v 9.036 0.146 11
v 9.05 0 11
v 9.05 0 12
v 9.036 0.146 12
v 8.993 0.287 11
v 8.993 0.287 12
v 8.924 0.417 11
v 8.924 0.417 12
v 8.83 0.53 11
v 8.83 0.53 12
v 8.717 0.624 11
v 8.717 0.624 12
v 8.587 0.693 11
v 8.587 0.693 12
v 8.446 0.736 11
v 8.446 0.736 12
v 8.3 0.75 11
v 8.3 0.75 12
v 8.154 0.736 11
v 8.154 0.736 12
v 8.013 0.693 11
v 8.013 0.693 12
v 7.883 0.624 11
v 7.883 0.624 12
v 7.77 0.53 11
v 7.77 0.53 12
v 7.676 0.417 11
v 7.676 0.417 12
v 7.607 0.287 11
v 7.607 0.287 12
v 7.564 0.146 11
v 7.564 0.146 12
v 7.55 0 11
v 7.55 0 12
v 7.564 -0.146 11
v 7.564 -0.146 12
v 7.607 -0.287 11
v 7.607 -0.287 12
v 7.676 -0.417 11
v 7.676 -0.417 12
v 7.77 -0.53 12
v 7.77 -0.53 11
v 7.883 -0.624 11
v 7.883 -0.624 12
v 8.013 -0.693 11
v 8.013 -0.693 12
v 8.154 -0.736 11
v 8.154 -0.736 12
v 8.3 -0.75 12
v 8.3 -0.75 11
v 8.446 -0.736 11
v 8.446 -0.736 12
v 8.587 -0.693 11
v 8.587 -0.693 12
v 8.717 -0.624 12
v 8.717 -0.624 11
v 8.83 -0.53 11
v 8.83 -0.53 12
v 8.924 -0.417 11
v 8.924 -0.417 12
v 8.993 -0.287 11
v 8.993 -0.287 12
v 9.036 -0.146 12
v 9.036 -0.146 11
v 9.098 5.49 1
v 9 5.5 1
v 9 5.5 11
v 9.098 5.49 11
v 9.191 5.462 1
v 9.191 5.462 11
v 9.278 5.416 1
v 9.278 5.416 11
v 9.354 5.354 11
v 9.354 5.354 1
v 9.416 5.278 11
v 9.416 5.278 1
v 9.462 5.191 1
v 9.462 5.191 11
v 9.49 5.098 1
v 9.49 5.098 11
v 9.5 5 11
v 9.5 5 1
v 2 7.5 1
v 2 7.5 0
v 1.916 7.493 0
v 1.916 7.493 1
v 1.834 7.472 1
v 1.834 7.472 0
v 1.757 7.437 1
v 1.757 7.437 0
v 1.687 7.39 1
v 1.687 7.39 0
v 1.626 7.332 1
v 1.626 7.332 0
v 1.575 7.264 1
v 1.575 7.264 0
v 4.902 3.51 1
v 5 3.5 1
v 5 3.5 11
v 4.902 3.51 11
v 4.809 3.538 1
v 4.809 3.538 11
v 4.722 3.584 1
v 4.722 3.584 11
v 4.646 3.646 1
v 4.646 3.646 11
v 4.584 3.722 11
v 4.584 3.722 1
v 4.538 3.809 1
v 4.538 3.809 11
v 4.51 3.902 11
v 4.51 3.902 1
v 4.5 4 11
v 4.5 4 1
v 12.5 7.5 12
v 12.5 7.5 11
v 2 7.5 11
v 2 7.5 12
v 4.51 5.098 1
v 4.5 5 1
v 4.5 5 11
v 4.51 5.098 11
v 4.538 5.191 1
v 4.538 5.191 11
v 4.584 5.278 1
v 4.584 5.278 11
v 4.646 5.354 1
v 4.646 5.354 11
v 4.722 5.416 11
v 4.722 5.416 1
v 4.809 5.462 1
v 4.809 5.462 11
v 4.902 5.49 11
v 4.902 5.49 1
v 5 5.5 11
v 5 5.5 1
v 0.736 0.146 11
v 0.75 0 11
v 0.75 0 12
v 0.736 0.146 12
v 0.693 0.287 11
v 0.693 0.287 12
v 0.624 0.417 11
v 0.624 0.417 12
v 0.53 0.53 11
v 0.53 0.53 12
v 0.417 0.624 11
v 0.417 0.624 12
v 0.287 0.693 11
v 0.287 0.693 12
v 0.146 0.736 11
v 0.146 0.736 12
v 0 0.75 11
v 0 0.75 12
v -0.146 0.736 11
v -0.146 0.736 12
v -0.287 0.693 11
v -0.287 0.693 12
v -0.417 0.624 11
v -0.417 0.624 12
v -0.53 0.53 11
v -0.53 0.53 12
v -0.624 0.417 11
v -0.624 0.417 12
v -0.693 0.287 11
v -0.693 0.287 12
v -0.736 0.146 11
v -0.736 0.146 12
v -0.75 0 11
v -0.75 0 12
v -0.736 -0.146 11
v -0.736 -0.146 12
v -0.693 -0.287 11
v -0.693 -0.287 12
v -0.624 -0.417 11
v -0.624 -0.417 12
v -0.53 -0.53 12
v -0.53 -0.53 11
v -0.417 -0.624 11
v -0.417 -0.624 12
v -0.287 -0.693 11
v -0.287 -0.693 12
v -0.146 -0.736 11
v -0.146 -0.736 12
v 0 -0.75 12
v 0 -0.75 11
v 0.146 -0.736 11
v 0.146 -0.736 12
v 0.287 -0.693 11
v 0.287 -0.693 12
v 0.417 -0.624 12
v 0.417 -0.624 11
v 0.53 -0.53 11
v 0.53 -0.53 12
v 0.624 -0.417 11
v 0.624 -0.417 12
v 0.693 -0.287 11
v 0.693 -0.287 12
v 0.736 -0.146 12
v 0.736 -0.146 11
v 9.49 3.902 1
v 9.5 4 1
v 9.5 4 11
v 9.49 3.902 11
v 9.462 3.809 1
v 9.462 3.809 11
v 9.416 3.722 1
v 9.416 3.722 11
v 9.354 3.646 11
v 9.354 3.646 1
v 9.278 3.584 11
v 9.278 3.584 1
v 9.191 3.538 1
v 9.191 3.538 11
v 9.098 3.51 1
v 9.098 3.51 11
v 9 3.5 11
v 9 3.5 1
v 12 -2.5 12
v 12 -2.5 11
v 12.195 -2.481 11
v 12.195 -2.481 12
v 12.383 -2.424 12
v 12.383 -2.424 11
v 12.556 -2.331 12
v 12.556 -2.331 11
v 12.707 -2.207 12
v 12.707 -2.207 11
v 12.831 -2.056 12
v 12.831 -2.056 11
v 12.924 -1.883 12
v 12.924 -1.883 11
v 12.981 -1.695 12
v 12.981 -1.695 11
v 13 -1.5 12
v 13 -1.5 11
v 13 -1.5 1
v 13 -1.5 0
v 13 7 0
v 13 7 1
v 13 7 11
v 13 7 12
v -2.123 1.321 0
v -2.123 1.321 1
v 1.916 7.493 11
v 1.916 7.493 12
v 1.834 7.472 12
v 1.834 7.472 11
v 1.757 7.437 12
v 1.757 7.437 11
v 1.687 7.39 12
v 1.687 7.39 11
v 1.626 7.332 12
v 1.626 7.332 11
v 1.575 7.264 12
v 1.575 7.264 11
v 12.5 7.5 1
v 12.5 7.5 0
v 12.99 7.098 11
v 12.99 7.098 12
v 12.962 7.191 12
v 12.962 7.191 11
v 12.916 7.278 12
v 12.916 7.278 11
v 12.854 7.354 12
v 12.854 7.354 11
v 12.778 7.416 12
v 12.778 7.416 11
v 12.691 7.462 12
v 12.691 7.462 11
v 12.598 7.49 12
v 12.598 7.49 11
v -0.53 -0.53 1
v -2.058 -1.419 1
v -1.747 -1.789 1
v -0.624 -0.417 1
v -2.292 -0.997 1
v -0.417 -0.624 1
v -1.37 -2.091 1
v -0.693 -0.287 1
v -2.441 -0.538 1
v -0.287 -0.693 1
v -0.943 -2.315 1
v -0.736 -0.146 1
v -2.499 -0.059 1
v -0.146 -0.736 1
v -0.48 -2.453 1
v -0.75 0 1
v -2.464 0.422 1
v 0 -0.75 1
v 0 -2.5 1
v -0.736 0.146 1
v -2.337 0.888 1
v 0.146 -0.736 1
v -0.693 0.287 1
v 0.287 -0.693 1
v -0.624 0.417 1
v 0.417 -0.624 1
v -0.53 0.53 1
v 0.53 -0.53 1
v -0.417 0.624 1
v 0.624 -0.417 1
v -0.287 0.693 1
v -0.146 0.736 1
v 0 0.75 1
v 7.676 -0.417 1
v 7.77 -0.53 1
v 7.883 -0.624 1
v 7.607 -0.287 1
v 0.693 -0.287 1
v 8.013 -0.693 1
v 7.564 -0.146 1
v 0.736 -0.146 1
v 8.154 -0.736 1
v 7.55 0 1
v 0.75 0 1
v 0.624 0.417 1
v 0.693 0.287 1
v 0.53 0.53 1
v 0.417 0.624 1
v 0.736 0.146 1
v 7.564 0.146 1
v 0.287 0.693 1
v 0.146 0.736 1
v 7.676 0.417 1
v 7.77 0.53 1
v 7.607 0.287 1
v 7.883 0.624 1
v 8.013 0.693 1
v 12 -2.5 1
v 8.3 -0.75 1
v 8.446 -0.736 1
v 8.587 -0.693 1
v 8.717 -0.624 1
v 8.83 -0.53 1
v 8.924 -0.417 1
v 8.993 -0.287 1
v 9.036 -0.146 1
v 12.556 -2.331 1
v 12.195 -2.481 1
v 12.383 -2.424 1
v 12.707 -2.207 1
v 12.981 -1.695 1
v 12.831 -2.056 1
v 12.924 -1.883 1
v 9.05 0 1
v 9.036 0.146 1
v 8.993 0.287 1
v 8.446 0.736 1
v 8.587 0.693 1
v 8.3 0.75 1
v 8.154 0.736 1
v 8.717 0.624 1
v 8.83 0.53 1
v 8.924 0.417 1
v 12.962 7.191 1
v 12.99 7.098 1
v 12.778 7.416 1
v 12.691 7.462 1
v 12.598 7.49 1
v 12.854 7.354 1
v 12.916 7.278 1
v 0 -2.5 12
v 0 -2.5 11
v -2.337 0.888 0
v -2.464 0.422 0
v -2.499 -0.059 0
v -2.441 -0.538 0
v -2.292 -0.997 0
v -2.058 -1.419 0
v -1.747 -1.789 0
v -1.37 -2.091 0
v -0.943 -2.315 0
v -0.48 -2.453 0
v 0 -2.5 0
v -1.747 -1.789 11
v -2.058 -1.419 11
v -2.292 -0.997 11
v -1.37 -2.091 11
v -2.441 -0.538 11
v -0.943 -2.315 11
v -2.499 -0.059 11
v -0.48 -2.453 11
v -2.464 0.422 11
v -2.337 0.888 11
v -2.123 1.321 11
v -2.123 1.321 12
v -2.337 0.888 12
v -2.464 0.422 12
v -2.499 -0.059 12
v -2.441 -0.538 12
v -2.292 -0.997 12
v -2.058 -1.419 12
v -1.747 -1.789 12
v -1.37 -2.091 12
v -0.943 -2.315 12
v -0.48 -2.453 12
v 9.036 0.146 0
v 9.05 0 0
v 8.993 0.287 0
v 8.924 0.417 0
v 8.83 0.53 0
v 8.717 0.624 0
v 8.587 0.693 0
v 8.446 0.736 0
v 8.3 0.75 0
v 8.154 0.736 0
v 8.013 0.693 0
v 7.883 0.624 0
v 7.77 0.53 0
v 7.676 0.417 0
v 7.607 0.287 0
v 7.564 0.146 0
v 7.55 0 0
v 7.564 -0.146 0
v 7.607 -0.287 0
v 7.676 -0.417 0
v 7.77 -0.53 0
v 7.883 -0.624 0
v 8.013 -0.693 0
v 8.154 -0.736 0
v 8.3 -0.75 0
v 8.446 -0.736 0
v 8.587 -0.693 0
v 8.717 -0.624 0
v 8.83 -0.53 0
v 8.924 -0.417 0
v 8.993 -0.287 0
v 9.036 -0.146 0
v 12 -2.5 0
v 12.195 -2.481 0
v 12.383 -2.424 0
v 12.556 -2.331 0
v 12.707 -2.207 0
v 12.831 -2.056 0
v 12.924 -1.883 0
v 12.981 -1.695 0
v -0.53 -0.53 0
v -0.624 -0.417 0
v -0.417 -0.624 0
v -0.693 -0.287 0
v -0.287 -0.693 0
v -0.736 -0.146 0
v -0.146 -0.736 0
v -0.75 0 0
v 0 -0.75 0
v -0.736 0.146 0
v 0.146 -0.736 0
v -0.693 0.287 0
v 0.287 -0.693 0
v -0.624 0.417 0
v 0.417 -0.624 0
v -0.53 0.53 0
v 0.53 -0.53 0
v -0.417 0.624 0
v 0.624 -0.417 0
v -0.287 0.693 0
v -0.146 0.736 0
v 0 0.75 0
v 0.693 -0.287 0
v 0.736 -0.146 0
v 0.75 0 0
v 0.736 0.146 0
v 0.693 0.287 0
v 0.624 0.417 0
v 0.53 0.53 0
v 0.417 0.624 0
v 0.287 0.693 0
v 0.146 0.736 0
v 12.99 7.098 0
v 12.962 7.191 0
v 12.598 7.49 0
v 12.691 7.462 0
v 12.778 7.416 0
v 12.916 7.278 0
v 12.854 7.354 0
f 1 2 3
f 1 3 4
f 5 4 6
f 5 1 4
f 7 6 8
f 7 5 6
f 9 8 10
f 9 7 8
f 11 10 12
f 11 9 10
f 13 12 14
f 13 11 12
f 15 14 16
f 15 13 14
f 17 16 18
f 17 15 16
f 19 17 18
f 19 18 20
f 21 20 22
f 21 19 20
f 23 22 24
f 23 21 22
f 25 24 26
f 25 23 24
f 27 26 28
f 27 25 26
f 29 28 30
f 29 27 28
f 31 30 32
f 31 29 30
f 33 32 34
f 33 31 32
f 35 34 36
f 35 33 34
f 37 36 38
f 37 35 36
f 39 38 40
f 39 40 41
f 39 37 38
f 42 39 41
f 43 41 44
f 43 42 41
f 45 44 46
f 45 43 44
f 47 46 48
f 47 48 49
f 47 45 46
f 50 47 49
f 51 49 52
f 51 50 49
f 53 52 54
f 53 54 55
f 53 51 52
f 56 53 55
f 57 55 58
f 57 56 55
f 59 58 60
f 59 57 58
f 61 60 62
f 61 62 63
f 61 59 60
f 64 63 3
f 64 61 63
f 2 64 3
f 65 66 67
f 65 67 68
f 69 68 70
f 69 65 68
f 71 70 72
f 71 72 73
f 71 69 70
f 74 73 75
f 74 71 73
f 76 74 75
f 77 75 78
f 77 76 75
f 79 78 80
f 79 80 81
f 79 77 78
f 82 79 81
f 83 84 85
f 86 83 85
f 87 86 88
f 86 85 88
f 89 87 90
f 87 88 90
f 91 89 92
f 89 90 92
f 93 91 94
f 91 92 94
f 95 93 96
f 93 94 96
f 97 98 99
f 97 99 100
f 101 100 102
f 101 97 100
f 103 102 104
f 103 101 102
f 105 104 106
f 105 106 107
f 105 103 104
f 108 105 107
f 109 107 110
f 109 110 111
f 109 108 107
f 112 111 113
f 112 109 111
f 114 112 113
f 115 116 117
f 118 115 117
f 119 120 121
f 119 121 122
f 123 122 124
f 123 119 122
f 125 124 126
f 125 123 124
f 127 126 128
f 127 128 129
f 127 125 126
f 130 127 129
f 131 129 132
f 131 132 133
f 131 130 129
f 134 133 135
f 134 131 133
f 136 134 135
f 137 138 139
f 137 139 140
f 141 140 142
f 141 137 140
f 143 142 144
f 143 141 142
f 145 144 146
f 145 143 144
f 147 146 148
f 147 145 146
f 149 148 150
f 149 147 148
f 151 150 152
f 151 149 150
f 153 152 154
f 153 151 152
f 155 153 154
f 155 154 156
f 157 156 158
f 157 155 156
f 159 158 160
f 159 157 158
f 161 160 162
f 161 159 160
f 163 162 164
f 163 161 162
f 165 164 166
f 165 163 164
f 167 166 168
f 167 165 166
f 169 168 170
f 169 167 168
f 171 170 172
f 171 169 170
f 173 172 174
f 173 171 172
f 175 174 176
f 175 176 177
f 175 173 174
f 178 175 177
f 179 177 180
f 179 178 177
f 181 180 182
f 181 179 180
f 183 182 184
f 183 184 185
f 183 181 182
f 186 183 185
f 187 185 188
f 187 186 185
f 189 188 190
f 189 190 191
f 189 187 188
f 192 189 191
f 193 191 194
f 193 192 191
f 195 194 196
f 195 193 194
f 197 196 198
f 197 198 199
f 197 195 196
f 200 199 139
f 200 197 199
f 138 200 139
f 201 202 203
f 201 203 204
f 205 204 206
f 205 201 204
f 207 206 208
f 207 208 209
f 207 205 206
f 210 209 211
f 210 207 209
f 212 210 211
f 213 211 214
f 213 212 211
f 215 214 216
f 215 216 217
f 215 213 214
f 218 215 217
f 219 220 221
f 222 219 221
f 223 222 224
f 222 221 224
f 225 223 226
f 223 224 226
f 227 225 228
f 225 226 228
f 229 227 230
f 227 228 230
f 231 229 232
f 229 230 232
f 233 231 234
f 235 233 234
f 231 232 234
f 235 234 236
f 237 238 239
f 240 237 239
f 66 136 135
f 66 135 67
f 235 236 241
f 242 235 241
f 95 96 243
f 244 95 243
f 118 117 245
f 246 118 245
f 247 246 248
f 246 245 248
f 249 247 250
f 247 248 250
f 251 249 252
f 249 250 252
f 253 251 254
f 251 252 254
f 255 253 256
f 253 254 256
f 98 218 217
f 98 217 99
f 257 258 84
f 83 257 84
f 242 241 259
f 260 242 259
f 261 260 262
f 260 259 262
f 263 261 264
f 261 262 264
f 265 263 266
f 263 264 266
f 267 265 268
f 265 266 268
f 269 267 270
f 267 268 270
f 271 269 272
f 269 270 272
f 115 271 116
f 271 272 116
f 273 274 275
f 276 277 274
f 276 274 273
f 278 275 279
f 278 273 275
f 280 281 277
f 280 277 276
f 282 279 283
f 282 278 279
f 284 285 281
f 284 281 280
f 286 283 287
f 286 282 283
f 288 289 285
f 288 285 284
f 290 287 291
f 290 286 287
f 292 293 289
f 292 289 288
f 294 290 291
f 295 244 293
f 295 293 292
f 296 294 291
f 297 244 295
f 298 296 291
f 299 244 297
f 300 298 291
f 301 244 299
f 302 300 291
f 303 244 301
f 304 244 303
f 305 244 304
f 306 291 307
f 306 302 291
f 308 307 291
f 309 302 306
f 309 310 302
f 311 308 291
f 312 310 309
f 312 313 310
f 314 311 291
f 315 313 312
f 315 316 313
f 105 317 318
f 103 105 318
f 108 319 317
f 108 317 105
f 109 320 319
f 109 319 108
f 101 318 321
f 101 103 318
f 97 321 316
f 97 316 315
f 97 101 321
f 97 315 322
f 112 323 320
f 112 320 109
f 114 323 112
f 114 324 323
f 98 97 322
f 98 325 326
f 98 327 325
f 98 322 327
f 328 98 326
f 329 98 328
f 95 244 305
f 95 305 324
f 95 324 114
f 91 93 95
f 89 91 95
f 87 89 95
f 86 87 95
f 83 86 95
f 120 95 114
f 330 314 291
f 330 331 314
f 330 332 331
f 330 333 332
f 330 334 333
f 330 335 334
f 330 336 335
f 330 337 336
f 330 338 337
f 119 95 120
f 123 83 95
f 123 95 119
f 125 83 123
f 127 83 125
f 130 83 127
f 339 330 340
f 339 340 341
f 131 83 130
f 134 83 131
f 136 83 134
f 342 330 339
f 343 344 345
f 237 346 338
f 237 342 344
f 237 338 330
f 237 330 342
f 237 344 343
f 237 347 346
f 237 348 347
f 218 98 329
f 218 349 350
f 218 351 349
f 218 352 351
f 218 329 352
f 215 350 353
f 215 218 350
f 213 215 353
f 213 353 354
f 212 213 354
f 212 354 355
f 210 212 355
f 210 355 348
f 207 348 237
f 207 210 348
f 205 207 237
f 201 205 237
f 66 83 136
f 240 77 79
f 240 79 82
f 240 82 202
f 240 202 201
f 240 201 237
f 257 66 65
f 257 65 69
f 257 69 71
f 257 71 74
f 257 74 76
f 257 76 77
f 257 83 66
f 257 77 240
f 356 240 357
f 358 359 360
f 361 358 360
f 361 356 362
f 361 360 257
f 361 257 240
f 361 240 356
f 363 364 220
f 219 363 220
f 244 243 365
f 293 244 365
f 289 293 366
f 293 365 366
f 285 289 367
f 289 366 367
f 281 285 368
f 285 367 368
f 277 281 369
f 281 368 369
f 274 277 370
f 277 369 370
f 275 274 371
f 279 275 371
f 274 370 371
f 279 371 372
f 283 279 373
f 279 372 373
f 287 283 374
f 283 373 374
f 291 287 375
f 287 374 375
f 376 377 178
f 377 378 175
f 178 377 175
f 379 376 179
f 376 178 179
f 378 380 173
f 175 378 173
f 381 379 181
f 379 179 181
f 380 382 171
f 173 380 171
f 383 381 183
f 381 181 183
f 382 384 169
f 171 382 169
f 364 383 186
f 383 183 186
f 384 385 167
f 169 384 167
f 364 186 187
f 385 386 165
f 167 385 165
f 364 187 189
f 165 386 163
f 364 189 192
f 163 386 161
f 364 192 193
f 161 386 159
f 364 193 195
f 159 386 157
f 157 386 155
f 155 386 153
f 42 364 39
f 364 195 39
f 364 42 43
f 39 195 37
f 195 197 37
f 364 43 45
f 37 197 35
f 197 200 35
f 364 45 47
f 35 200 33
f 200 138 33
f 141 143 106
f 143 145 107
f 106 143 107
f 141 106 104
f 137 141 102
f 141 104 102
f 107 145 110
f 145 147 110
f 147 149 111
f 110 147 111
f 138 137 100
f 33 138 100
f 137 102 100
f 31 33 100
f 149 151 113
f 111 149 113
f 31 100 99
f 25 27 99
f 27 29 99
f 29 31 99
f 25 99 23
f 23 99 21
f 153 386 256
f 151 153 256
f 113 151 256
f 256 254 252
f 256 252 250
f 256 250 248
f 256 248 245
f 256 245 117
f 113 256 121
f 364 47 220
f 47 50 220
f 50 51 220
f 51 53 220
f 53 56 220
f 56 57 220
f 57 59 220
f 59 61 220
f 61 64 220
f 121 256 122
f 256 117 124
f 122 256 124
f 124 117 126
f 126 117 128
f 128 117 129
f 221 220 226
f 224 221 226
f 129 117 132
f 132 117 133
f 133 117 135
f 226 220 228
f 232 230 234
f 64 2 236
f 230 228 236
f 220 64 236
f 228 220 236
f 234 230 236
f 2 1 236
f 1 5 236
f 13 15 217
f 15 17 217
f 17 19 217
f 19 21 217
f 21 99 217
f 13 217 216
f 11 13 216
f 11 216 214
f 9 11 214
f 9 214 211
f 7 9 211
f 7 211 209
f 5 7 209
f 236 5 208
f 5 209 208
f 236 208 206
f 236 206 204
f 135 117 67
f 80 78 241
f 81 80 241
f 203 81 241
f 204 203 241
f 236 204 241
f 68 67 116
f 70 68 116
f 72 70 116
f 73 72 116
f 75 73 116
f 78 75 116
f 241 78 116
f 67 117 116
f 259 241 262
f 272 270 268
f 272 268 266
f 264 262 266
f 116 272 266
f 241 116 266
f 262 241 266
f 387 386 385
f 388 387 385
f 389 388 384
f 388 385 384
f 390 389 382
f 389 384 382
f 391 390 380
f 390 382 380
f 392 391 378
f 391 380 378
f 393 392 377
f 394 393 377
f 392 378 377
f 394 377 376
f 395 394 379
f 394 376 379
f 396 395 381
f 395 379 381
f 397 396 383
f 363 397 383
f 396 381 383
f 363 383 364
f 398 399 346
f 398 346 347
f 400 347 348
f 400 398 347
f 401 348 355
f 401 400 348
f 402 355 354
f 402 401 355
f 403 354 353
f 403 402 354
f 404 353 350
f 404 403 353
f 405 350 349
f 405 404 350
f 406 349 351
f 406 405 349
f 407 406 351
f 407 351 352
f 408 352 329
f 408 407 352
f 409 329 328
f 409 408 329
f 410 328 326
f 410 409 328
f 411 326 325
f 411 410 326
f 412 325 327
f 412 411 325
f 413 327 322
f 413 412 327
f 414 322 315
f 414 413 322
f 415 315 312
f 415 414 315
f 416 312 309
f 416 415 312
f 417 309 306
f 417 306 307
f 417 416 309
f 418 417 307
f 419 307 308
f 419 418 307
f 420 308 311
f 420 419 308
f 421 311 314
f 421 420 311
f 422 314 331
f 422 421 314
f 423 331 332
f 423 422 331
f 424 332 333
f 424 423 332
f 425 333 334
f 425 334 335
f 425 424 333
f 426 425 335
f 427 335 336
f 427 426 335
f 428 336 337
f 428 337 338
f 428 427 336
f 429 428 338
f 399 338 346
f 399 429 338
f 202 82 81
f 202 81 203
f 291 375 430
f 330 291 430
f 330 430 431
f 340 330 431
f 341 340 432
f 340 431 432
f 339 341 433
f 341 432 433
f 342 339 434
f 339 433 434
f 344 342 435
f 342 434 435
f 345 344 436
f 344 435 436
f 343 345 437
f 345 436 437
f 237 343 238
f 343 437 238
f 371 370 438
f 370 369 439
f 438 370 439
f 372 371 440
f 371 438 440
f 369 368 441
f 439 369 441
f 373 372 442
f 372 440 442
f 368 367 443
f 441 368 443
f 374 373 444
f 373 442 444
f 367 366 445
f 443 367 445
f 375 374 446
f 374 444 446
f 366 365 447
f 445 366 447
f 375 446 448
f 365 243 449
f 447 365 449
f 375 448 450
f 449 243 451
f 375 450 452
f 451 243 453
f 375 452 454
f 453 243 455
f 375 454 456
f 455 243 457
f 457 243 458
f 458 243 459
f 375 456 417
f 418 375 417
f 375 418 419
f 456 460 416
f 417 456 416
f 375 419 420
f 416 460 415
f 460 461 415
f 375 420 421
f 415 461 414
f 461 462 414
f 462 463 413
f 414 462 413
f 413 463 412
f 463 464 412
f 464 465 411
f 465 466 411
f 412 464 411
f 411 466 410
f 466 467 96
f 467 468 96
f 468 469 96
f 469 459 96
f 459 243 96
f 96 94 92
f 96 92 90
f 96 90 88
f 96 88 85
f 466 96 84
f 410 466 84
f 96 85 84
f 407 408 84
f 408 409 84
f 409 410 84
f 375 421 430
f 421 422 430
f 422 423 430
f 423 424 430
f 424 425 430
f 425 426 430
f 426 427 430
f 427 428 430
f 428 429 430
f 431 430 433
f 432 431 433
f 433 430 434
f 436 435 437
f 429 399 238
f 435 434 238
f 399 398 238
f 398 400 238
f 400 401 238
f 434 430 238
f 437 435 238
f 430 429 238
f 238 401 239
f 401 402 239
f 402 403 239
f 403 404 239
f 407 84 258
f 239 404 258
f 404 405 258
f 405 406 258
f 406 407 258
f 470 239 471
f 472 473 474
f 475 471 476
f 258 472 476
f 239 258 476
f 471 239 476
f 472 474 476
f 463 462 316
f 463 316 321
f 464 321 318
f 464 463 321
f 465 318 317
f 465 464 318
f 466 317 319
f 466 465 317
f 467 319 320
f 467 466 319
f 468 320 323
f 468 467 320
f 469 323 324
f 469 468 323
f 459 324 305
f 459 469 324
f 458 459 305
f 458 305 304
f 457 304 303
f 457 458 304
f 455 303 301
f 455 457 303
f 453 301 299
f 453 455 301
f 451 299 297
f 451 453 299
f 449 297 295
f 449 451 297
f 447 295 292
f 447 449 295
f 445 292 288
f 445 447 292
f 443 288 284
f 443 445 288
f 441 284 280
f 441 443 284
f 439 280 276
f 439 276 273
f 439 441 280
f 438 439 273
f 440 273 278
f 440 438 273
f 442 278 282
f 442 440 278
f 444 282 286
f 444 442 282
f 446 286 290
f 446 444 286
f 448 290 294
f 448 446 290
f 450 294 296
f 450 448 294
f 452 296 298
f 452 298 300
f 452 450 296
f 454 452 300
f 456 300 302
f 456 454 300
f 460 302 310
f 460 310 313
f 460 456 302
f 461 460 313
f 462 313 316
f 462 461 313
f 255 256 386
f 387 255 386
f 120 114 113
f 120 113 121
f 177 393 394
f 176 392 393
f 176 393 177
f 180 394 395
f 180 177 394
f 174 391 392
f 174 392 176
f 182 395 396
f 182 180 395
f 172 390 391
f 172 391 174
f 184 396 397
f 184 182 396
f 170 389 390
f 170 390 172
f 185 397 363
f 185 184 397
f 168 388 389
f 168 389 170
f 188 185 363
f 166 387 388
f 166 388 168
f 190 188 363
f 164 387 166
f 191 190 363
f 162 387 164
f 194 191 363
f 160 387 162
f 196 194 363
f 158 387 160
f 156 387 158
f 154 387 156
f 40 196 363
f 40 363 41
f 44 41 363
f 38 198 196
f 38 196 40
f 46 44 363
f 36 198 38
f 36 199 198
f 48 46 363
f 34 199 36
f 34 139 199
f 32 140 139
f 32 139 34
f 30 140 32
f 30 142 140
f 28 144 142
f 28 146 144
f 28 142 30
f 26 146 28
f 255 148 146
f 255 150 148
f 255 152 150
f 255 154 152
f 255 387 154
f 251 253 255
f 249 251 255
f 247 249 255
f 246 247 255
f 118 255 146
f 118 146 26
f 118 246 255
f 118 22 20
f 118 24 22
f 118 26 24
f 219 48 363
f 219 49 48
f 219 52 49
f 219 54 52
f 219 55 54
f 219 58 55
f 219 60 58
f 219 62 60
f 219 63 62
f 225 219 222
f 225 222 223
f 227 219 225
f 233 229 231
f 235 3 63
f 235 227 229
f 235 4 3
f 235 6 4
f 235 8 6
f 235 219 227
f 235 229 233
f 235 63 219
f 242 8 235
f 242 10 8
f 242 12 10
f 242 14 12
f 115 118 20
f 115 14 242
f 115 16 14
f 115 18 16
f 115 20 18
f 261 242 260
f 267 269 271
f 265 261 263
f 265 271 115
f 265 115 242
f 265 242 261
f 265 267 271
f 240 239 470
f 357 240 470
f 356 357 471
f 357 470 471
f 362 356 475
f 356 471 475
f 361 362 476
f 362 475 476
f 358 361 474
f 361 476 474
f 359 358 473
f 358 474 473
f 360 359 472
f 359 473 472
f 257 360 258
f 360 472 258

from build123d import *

# Parameters (mm, degrees)
SKETCH1_R           = 0.75
BOSS_EXTRUDE1_DEPTH = 1
BOSS_EXTRUDE2_START = 1
BOSS_EXTRUDE2_DEPTH = 10
BOSS_EXTRUDE3_START = 11
SKETCH1_4_R         = 0.75
BOSS_EXTRUDE3_DEPTH = 1


with BuildPart() as part:
    # Sketch1 → Boss-Extrude1 (new body)
    with BuildSketch(Plane.XY):
        with BuildLine():
            Line((1.575471698, 7.264150943), (-2.122641509, 1.320754717))
            ThreePointArc((-2.122641509, 1.320754717), (-2.18539319, -1.214107328), (0, -2.5))
            Line((0, -2.5), (12, -2.5))
            ThreePointArc((12, -2.5), (12.707106781, -2.207106781), (13, -1.5))
            Line((13, -1.5), (13, 7))
            ThreePointArc((13, 7), (12.853553391, 7.353553391), (12.5, 7.5))
            Line((12.5, 7.5), (2, 7.5))
            ThreePointArc((2, 7.5), (1.757178534, 7.437078638), (1.575471698, 7.264150943))
        make_face()
        Circle(SKETCH1_R, mode=Mode.SUBTRACT)
        with Locations((8.3, 0)):
            Circle(SKETCH1_R, mode=Mode.SUBTRACT)
    extrude(amount=BOSS_EXTRUDE1_DEPTH)

    # Sketch1<3> → Boss-Extrude2 (add)
    with BuildSketch(Plane.XY.offset(BOSS_EXTRUDE2_START)):
        with BuildLine():
            Line((5, 5.5), (9, 5.5))
            ThreePointArc((9, 5.5), (9.353553391, 5.353553391), (9.5, 5))
            Line((9.5, 5), (9.5, 4))
            ThreePointArc((9.5, 4), (9.353553391, 3.646446609), (9, 3.5))
            Line((9, 3.5), (5, 3.5))
            ThreePointArc((5, 3.5), (4.646446609, 3.646446609), (4.5, 4))
            Line((4.5, 4), (4.5, 5))
            ThreePointArc((4.5, 5), (4.646446609, 5.353553391), (5, 5.5))
        make_face()
    extrude(amount=BOSS_EXTRUDE2_DEPTH)

    # Sketch1<4> → Boss-Extrude3 (add)
    with BuildSketch(Plane.XY.offset(BOSS_EXTRUDE3_START)):
        with BuildLine():
            Line((1.575471698, 7.264150943), (-2.122641509, 1.320754717))
            ThreePointArc((-2.122641509, 1.320754717), (-2.18539319, -1.214107328), (0, -2.5))
            Line((0, -2.5), (12, -2.5))
            ThreePointArc((12, -2.5), (12.707106781, -2.207106781), (13, -1.5))
            Line((13, -1.5), (13, 7))
            ThreePointArc((13, 7), (12.853553391, 7.353553391), (12.5, 7.5))
            Line((12.5, 7.5), (2, 7.5))
            ThreePointArc((2, 7.5), (1.757178534, 7.437078638), (1.575471698, 7.264150943))
        make_face()
        Circle(SKETCH1_4_R, mode=Mode.SUBTRACT)
        with Locations((8.3, 0)):
            Circle(SKETCH1_4_R, mode=Mode.SUBTRACT)
    extrude(amount=BOSS_EXTRUDE3_DEPTH)


solid = part.part
